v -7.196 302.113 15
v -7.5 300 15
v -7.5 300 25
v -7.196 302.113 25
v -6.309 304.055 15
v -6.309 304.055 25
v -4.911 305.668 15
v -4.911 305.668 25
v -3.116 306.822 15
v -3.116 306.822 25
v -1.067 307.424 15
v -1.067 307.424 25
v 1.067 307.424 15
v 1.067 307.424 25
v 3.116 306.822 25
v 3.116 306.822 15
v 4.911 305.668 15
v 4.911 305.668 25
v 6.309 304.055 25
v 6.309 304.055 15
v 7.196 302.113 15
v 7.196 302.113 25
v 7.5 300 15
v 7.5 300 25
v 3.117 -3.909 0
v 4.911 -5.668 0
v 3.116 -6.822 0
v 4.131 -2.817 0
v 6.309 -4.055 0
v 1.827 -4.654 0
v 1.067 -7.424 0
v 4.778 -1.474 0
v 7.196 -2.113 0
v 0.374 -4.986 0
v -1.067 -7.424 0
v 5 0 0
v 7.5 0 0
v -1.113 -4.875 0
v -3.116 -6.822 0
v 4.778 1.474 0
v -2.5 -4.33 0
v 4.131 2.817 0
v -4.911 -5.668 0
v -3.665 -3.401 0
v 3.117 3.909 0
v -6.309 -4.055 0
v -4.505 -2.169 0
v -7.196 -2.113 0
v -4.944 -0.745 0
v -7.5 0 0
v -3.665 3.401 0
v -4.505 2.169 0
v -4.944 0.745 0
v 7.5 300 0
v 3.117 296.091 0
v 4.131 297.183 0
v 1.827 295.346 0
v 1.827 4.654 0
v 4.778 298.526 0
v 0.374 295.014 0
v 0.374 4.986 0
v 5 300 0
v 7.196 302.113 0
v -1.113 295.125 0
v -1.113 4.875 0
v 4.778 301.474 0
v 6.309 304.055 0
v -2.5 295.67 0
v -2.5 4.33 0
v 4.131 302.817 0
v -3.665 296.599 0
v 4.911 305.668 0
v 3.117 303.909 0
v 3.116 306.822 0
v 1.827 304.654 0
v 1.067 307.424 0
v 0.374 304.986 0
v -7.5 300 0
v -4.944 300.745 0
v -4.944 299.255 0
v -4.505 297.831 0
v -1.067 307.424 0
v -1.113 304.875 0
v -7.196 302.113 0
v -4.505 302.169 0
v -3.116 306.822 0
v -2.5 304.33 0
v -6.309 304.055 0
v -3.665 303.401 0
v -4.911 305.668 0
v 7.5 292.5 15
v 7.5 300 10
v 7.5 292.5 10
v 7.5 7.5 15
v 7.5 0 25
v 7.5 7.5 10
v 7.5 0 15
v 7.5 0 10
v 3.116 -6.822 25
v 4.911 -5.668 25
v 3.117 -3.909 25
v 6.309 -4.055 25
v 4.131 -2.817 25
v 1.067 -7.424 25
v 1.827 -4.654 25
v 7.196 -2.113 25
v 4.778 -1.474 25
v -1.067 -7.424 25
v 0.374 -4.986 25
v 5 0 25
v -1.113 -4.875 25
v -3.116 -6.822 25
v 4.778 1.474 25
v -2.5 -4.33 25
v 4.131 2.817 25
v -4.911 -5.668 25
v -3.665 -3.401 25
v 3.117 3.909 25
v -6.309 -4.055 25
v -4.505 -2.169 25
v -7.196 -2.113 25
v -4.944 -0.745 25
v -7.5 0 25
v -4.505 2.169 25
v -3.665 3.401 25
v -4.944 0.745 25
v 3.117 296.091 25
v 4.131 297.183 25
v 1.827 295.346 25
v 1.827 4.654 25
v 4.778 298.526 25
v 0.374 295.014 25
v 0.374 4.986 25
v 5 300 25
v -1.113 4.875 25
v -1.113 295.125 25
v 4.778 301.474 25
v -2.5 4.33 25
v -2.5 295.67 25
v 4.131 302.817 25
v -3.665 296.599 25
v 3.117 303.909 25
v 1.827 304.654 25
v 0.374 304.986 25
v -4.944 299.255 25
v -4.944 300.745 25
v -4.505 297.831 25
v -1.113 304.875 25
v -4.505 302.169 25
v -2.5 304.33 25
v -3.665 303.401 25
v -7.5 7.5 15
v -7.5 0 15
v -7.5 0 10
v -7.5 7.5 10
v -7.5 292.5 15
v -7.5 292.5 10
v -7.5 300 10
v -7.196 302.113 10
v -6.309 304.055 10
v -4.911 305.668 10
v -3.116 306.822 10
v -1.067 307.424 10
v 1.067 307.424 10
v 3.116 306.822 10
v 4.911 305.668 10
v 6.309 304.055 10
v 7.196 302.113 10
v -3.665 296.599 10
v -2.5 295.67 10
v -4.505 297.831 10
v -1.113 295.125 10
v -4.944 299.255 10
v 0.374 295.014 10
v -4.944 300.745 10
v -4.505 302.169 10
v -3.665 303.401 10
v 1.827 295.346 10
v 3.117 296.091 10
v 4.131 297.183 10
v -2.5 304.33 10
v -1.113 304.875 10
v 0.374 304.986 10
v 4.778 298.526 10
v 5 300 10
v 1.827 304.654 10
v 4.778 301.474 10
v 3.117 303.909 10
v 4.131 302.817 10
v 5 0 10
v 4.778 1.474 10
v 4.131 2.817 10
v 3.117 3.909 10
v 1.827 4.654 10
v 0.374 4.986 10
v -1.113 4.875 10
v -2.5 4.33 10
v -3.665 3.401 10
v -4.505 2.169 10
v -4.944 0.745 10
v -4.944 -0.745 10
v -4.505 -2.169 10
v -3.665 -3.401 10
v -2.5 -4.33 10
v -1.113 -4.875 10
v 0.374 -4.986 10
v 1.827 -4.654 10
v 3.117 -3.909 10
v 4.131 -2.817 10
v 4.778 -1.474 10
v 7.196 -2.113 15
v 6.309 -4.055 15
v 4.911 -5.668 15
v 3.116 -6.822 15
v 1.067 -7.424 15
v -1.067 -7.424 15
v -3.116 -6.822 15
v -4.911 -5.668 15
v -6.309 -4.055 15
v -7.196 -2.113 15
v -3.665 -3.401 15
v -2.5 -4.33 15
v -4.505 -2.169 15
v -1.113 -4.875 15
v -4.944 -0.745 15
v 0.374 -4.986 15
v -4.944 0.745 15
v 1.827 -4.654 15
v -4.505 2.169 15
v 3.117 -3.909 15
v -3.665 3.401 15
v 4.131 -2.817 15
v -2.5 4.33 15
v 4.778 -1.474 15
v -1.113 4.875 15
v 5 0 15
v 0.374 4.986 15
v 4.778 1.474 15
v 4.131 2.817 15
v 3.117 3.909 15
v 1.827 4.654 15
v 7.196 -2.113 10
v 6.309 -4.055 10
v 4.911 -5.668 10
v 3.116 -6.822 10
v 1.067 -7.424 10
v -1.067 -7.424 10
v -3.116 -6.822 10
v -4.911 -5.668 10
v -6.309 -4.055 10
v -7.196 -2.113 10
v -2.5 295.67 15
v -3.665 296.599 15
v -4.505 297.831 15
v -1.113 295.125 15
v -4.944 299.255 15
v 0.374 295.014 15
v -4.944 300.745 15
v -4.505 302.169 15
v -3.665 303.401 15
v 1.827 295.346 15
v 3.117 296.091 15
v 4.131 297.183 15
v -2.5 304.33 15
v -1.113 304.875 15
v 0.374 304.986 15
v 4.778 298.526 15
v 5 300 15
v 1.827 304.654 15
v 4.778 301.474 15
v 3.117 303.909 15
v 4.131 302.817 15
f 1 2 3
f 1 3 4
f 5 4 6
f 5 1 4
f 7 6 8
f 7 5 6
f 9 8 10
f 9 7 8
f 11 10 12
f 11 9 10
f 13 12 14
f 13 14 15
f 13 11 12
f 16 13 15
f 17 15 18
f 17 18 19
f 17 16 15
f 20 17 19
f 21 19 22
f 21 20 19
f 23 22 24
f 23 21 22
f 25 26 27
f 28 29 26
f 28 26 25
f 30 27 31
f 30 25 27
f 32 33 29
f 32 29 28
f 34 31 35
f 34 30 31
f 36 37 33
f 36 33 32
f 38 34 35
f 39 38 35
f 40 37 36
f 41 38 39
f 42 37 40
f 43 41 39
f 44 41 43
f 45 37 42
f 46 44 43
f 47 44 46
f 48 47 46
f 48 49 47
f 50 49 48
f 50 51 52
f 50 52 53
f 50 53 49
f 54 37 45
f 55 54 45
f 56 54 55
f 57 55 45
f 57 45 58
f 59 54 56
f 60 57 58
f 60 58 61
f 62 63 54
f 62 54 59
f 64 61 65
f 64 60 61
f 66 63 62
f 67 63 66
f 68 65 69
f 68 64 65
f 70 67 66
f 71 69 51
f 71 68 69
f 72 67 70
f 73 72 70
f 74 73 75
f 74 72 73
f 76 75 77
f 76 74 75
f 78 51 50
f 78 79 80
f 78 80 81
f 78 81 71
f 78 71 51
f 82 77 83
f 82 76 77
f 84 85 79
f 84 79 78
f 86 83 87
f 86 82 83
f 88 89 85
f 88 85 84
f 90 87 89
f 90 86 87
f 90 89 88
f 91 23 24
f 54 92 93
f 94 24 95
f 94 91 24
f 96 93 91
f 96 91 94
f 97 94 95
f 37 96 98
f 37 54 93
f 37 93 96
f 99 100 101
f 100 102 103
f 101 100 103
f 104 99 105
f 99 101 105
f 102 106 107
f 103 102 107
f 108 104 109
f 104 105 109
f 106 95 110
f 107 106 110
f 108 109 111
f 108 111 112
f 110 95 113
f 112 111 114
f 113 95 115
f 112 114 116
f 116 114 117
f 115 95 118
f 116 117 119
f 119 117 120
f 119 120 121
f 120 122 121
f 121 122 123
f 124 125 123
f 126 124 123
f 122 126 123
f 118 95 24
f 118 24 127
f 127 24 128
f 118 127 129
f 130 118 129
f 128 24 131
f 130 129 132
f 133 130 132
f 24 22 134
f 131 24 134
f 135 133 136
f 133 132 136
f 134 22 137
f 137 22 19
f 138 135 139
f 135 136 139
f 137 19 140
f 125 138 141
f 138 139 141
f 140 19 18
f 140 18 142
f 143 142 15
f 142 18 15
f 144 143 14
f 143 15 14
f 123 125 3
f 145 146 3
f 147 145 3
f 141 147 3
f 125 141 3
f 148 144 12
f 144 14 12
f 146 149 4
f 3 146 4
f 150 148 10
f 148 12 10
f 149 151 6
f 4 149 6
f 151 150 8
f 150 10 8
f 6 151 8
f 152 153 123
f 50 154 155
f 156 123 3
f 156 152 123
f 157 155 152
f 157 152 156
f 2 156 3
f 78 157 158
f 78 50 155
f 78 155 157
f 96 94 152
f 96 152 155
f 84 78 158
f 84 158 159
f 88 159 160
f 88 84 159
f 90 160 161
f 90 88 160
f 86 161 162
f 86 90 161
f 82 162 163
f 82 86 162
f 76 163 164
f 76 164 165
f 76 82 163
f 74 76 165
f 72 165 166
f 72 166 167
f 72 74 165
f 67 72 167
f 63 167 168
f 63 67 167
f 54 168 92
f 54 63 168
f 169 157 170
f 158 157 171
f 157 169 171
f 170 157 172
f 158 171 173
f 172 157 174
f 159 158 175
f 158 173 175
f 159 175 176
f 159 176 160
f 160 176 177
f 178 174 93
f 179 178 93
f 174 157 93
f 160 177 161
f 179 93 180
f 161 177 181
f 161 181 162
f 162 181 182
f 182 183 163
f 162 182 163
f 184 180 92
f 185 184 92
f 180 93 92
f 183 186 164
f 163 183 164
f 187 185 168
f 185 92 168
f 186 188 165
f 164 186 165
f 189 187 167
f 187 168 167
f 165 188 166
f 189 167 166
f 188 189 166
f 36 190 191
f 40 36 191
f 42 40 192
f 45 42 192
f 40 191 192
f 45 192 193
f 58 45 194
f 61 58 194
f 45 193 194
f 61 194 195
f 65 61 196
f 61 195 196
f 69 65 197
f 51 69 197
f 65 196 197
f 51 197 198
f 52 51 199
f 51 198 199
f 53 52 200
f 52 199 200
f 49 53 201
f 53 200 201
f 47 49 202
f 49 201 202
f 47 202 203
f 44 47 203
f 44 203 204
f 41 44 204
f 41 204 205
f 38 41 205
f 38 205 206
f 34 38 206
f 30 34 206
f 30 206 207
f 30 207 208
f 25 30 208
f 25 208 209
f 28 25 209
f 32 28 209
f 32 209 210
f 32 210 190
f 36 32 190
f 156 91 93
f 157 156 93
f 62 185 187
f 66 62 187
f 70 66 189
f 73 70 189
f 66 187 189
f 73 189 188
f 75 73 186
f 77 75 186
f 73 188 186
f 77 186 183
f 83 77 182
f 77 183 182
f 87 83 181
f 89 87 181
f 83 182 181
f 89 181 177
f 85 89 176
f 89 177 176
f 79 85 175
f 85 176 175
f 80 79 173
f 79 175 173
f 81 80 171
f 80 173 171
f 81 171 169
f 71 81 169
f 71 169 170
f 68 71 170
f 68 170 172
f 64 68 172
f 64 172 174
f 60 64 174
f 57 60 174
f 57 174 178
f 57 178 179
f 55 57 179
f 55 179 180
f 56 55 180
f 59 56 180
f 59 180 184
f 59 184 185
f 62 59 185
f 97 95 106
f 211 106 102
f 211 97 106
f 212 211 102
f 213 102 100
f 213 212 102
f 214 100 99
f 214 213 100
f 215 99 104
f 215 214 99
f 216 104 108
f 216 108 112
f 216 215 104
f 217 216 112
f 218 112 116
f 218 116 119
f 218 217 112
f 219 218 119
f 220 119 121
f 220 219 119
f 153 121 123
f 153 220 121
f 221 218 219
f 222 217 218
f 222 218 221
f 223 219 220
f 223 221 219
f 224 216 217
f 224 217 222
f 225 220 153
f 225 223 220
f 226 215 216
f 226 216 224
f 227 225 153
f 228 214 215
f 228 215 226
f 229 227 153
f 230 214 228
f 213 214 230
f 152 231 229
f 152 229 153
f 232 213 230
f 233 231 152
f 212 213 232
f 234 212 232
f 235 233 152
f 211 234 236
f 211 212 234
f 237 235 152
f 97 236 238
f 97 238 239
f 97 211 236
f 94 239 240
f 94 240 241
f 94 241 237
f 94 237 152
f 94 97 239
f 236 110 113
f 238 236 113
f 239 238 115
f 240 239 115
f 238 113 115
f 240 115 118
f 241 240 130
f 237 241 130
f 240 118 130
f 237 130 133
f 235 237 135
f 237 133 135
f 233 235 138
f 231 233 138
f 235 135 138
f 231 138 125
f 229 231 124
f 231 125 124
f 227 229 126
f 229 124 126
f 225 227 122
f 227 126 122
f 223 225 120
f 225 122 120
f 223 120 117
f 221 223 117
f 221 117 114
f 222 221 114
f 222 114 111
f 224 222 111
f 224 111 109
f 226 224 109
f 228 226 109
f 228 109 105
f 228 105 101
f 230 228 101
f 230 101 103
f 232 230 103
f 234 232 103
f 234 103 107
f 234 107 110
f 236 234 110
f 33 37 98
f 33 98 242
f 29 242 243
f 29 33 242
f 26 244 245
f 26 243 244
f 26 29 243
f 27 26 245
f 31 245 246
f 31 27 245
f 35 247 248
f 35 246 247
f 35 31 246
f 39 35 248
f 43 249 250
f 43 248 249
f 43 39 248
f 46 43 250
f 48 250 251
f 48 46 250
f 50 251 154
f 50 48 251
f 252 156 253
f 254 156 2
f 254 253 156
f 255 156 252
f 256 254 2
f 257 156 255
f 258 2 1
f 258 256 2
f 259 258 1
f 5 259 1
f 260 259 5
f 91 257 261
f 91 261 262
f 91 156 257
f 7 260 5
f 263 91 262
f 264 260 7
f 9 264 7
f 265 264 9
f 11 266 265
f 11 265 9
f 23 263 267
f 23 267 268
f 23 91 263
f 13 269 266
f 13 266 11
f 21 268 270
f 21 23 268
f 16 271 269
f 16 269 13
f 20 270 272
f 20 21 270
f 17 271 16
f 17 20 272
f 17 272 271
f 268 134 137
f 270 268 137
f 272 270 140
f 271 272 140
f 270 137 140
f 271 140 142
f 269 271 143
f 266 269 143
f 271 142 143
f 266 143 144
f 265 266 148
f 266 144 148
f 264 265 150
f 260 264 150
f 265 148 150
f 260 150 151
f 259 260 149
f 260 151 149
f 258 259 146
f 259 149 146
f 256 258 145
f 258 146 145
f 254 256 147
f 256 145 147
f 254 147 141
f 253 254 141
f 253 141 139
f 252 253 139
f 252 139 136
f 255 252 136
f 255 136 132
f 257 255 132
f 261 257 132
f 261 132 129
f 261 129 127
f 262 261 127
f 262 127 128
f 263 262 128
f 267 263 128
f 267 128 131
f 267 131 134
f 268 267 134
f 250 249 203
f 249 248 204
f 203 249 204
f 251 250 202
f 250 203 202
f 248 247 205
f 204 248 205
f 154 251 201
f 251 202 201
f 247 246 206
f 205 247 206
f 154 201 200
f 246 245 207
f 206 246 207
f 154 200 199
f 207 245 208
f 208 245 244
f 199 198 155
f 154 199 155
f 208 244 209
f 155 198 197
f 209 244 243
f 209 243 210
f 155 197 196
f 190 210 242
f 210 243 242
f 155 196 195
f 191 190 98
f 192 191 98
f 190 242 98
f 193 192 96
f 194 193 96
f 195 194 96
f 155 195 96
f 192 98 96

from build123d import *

# Parameters (mm, degrees)
EXTRUDE_1_DEPTH     = 25
SKETCH_2_W          = 5
SKETCH_2_H          = 15
CUT_EXTRUDE_1_DEPTH = 309.879021625
SKETCH_3_R          = 5
CUT_EXTRUDE_2_DEPTH = 309.605735527


with BuildPart() as part:
    # 草图1 → 凸台-拉伸1 (new body)
    with BuildSketch(Plane.XY):
        with BuildLine():
            Line((-7.5, 0), (-7.5, 300))
            ThreePointArc((-7.5, 300), (0, 307.5), (7.5, 300))
            Line((7.5, 300), (7.5, 0))
            ThreePointArc((7.5, 0), (0, -7.5), (-7.5, 0))
        make_face()
    extrude(amount=EXTRUDE_1_DEPTH)

    # 草图2 → 切除-拉伸1 (cut, through all)
    with BuildSketch(Plane(origin=(7.5, 0, 0), x_dir=(0, 0, -1), z_dir=(1, 0, 0))):
        with Locations((-12.5, 300)):
            Rectangle(SKETCH_2_W, SKETCH_2_H)
        with Locations((-12.5, 0)):
            Rectangle(SKETCH_2_W, SKETCH_2_H)
    extrude(amount=-CUT_EXTRUDE_1_DEPTH, mode=Mode.SUBTRACT)

    # 草图3 → 切除-拉伸2 (cut, through all)
    with BuildSketch(Plane.XY.offset(25)):
        with Locations((0, 300)):
            Circle(SKETCH_3_R)
        Circle(SKETCH_3_R)
    extrude(amount=-CUT_EXTRUDE_2_DEPTH, mode=Mode.SUBTRACT)


solid = part.part
